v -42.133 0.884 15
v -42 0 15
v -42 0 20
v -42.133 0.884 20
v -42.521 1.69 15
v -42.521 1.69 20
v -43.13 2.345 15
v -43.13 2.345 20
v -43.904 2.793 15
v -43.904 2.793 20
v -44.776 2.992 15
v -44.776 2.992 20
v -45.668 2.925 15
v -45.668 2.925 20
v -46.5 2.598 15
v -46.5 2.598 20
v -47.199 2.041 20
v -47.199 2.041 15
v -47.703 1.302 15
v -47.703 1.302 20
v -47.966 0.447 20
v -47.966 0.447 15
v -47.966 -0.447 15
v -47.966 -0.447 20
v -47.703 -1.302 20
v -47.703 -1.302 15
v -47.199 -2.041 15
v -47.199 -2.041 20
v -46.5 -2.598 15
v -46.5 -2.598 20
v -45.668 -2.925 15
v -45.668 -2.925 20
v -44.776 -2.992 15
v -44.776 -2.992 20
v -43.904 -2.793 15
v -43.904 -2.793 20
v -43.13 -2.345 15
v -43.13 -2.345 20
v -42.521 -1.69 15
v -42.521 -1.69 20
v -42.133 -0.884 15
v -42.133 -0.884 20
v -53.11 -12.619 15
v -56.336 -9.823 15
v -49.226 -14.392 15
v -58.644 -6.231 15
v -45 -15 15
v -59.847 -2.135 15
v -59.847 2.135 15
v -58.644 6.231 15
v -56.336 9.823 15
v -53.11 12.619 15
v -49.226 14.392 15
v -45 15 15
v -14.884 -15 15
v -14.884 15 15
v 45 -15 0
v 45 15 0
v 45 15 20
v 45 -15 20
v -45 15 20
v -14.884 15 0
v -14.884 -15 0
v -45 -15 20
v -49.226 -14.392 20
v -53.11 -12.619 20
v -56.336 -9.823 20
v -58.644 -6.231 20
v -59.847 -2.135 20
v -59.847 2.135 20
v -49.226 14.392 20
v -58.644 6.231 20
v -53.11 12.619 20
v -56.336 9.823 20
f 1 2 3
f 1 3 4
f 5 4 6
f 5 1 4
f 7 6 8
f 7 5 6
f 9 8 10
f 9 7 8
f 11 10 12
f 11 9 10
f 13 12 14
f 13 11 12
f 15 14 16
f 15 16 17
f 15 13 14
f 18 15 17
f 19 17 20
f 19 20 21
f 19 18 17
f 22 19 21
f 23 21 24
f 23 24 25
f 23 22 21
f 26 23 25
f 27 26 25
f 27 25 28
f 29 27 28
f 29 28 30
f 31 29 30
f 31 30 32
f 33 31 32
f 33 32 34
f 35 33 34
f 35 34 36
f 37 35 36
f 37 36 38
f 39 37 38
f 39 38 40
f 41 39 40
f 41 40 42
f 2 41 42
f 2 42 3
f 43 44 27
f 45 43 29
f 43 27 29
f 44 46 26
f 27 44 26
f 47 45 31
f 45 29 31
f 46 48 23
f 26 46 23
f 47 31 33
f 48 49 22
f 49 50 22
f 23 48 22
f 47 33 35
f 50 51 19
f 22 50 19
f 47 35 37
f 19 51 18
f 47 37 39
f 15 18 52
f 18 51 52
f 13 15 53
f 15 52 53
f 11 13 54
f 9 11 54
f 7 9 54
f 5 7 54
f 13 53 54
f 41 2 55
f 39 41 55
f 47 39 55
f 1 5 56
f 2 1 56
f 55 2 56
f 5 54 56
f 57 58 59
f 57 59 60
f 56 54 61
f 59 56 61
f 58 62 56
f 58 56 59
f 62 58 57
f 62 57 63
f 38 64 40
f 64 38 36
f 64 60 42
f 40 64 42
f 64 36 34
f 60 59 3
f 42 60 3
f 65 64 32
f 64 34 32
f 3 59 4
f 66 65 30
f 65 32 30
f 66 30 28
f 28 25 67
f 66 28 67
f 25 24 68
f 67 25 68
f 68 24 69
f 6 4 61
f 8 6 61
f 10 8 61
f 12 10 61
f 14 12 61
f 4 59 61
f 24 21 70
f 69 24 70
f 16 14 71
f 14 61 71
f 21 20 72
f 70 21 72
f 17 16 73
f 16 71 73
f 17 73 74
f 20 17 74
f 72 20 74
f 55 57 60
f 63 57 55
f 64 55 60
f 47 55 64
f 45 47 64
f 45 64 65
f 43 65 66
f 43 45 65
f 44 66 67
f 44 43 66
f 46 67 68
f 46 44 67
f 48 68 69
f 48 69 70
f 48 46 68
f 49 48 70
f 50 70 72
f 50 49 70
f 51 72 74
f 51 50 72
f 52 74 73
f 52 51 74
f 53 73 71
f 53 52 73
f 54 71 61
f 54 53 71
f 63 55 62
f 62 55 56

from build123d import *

# Parameters (mm, degrees)
SKETCH_1_R          = 3
EXTRUDE_1_DEPTH     = 20
SKETCH_2_W          = 31.985989971
SKETCH_2_H          = 30
CUT_EXTRUDE_2_DEPTH = 64.639610307
SKETCH_3_W          = 45
SKETCH_3_H          = 30
CUT_EXTRUDE_3_DEPTH = 64.639610307


with BuildPart() as part:
    # 草图1 → 凸台-拉伸1 (new body)
    with BuildSketch(Plane.XY):
        with BuildLine():
            Line((-45, 15), (45, 15))
            Line((45, 15), (45, -15))
            Line((45, -15), (-45, -15))
            ThreePointArc((-45, -15), (-60, 0), (-45, 15))
        make_face()
        with Locations((-45, 0)):
            Circle(SKETCH_1_R, mode=Mode.SUBTRACT)
    extrude(amount=EXTRUDE_1_DEPTH)

    # 草图2 → 切除-拉伸2 (cut, through all)
    with BuildSketch(Plane.XY.offset(15)):
        with Locations((-45.637141889, 0)):
            Rectangle(SKETCH_2_W, SKETCH_2_H)
    extrude(amount=-CUT_EXTRUDE_2_DEPTH, mode=Mode.SUBTRACT)

    # 草图3 → 切除-拉伸3 (cut, through all)
    with BuildSketch(Plane.XY.offset(15)):
        with Locations((-37.384024781, 0)):
            Rectangle(SKETCH_3_W, SKETCH_3_H)
    extrude(amount=-CUT_EXTRUDE_3_DEPTH, mode=Mode.SUBTRACT)


solid = part.part
